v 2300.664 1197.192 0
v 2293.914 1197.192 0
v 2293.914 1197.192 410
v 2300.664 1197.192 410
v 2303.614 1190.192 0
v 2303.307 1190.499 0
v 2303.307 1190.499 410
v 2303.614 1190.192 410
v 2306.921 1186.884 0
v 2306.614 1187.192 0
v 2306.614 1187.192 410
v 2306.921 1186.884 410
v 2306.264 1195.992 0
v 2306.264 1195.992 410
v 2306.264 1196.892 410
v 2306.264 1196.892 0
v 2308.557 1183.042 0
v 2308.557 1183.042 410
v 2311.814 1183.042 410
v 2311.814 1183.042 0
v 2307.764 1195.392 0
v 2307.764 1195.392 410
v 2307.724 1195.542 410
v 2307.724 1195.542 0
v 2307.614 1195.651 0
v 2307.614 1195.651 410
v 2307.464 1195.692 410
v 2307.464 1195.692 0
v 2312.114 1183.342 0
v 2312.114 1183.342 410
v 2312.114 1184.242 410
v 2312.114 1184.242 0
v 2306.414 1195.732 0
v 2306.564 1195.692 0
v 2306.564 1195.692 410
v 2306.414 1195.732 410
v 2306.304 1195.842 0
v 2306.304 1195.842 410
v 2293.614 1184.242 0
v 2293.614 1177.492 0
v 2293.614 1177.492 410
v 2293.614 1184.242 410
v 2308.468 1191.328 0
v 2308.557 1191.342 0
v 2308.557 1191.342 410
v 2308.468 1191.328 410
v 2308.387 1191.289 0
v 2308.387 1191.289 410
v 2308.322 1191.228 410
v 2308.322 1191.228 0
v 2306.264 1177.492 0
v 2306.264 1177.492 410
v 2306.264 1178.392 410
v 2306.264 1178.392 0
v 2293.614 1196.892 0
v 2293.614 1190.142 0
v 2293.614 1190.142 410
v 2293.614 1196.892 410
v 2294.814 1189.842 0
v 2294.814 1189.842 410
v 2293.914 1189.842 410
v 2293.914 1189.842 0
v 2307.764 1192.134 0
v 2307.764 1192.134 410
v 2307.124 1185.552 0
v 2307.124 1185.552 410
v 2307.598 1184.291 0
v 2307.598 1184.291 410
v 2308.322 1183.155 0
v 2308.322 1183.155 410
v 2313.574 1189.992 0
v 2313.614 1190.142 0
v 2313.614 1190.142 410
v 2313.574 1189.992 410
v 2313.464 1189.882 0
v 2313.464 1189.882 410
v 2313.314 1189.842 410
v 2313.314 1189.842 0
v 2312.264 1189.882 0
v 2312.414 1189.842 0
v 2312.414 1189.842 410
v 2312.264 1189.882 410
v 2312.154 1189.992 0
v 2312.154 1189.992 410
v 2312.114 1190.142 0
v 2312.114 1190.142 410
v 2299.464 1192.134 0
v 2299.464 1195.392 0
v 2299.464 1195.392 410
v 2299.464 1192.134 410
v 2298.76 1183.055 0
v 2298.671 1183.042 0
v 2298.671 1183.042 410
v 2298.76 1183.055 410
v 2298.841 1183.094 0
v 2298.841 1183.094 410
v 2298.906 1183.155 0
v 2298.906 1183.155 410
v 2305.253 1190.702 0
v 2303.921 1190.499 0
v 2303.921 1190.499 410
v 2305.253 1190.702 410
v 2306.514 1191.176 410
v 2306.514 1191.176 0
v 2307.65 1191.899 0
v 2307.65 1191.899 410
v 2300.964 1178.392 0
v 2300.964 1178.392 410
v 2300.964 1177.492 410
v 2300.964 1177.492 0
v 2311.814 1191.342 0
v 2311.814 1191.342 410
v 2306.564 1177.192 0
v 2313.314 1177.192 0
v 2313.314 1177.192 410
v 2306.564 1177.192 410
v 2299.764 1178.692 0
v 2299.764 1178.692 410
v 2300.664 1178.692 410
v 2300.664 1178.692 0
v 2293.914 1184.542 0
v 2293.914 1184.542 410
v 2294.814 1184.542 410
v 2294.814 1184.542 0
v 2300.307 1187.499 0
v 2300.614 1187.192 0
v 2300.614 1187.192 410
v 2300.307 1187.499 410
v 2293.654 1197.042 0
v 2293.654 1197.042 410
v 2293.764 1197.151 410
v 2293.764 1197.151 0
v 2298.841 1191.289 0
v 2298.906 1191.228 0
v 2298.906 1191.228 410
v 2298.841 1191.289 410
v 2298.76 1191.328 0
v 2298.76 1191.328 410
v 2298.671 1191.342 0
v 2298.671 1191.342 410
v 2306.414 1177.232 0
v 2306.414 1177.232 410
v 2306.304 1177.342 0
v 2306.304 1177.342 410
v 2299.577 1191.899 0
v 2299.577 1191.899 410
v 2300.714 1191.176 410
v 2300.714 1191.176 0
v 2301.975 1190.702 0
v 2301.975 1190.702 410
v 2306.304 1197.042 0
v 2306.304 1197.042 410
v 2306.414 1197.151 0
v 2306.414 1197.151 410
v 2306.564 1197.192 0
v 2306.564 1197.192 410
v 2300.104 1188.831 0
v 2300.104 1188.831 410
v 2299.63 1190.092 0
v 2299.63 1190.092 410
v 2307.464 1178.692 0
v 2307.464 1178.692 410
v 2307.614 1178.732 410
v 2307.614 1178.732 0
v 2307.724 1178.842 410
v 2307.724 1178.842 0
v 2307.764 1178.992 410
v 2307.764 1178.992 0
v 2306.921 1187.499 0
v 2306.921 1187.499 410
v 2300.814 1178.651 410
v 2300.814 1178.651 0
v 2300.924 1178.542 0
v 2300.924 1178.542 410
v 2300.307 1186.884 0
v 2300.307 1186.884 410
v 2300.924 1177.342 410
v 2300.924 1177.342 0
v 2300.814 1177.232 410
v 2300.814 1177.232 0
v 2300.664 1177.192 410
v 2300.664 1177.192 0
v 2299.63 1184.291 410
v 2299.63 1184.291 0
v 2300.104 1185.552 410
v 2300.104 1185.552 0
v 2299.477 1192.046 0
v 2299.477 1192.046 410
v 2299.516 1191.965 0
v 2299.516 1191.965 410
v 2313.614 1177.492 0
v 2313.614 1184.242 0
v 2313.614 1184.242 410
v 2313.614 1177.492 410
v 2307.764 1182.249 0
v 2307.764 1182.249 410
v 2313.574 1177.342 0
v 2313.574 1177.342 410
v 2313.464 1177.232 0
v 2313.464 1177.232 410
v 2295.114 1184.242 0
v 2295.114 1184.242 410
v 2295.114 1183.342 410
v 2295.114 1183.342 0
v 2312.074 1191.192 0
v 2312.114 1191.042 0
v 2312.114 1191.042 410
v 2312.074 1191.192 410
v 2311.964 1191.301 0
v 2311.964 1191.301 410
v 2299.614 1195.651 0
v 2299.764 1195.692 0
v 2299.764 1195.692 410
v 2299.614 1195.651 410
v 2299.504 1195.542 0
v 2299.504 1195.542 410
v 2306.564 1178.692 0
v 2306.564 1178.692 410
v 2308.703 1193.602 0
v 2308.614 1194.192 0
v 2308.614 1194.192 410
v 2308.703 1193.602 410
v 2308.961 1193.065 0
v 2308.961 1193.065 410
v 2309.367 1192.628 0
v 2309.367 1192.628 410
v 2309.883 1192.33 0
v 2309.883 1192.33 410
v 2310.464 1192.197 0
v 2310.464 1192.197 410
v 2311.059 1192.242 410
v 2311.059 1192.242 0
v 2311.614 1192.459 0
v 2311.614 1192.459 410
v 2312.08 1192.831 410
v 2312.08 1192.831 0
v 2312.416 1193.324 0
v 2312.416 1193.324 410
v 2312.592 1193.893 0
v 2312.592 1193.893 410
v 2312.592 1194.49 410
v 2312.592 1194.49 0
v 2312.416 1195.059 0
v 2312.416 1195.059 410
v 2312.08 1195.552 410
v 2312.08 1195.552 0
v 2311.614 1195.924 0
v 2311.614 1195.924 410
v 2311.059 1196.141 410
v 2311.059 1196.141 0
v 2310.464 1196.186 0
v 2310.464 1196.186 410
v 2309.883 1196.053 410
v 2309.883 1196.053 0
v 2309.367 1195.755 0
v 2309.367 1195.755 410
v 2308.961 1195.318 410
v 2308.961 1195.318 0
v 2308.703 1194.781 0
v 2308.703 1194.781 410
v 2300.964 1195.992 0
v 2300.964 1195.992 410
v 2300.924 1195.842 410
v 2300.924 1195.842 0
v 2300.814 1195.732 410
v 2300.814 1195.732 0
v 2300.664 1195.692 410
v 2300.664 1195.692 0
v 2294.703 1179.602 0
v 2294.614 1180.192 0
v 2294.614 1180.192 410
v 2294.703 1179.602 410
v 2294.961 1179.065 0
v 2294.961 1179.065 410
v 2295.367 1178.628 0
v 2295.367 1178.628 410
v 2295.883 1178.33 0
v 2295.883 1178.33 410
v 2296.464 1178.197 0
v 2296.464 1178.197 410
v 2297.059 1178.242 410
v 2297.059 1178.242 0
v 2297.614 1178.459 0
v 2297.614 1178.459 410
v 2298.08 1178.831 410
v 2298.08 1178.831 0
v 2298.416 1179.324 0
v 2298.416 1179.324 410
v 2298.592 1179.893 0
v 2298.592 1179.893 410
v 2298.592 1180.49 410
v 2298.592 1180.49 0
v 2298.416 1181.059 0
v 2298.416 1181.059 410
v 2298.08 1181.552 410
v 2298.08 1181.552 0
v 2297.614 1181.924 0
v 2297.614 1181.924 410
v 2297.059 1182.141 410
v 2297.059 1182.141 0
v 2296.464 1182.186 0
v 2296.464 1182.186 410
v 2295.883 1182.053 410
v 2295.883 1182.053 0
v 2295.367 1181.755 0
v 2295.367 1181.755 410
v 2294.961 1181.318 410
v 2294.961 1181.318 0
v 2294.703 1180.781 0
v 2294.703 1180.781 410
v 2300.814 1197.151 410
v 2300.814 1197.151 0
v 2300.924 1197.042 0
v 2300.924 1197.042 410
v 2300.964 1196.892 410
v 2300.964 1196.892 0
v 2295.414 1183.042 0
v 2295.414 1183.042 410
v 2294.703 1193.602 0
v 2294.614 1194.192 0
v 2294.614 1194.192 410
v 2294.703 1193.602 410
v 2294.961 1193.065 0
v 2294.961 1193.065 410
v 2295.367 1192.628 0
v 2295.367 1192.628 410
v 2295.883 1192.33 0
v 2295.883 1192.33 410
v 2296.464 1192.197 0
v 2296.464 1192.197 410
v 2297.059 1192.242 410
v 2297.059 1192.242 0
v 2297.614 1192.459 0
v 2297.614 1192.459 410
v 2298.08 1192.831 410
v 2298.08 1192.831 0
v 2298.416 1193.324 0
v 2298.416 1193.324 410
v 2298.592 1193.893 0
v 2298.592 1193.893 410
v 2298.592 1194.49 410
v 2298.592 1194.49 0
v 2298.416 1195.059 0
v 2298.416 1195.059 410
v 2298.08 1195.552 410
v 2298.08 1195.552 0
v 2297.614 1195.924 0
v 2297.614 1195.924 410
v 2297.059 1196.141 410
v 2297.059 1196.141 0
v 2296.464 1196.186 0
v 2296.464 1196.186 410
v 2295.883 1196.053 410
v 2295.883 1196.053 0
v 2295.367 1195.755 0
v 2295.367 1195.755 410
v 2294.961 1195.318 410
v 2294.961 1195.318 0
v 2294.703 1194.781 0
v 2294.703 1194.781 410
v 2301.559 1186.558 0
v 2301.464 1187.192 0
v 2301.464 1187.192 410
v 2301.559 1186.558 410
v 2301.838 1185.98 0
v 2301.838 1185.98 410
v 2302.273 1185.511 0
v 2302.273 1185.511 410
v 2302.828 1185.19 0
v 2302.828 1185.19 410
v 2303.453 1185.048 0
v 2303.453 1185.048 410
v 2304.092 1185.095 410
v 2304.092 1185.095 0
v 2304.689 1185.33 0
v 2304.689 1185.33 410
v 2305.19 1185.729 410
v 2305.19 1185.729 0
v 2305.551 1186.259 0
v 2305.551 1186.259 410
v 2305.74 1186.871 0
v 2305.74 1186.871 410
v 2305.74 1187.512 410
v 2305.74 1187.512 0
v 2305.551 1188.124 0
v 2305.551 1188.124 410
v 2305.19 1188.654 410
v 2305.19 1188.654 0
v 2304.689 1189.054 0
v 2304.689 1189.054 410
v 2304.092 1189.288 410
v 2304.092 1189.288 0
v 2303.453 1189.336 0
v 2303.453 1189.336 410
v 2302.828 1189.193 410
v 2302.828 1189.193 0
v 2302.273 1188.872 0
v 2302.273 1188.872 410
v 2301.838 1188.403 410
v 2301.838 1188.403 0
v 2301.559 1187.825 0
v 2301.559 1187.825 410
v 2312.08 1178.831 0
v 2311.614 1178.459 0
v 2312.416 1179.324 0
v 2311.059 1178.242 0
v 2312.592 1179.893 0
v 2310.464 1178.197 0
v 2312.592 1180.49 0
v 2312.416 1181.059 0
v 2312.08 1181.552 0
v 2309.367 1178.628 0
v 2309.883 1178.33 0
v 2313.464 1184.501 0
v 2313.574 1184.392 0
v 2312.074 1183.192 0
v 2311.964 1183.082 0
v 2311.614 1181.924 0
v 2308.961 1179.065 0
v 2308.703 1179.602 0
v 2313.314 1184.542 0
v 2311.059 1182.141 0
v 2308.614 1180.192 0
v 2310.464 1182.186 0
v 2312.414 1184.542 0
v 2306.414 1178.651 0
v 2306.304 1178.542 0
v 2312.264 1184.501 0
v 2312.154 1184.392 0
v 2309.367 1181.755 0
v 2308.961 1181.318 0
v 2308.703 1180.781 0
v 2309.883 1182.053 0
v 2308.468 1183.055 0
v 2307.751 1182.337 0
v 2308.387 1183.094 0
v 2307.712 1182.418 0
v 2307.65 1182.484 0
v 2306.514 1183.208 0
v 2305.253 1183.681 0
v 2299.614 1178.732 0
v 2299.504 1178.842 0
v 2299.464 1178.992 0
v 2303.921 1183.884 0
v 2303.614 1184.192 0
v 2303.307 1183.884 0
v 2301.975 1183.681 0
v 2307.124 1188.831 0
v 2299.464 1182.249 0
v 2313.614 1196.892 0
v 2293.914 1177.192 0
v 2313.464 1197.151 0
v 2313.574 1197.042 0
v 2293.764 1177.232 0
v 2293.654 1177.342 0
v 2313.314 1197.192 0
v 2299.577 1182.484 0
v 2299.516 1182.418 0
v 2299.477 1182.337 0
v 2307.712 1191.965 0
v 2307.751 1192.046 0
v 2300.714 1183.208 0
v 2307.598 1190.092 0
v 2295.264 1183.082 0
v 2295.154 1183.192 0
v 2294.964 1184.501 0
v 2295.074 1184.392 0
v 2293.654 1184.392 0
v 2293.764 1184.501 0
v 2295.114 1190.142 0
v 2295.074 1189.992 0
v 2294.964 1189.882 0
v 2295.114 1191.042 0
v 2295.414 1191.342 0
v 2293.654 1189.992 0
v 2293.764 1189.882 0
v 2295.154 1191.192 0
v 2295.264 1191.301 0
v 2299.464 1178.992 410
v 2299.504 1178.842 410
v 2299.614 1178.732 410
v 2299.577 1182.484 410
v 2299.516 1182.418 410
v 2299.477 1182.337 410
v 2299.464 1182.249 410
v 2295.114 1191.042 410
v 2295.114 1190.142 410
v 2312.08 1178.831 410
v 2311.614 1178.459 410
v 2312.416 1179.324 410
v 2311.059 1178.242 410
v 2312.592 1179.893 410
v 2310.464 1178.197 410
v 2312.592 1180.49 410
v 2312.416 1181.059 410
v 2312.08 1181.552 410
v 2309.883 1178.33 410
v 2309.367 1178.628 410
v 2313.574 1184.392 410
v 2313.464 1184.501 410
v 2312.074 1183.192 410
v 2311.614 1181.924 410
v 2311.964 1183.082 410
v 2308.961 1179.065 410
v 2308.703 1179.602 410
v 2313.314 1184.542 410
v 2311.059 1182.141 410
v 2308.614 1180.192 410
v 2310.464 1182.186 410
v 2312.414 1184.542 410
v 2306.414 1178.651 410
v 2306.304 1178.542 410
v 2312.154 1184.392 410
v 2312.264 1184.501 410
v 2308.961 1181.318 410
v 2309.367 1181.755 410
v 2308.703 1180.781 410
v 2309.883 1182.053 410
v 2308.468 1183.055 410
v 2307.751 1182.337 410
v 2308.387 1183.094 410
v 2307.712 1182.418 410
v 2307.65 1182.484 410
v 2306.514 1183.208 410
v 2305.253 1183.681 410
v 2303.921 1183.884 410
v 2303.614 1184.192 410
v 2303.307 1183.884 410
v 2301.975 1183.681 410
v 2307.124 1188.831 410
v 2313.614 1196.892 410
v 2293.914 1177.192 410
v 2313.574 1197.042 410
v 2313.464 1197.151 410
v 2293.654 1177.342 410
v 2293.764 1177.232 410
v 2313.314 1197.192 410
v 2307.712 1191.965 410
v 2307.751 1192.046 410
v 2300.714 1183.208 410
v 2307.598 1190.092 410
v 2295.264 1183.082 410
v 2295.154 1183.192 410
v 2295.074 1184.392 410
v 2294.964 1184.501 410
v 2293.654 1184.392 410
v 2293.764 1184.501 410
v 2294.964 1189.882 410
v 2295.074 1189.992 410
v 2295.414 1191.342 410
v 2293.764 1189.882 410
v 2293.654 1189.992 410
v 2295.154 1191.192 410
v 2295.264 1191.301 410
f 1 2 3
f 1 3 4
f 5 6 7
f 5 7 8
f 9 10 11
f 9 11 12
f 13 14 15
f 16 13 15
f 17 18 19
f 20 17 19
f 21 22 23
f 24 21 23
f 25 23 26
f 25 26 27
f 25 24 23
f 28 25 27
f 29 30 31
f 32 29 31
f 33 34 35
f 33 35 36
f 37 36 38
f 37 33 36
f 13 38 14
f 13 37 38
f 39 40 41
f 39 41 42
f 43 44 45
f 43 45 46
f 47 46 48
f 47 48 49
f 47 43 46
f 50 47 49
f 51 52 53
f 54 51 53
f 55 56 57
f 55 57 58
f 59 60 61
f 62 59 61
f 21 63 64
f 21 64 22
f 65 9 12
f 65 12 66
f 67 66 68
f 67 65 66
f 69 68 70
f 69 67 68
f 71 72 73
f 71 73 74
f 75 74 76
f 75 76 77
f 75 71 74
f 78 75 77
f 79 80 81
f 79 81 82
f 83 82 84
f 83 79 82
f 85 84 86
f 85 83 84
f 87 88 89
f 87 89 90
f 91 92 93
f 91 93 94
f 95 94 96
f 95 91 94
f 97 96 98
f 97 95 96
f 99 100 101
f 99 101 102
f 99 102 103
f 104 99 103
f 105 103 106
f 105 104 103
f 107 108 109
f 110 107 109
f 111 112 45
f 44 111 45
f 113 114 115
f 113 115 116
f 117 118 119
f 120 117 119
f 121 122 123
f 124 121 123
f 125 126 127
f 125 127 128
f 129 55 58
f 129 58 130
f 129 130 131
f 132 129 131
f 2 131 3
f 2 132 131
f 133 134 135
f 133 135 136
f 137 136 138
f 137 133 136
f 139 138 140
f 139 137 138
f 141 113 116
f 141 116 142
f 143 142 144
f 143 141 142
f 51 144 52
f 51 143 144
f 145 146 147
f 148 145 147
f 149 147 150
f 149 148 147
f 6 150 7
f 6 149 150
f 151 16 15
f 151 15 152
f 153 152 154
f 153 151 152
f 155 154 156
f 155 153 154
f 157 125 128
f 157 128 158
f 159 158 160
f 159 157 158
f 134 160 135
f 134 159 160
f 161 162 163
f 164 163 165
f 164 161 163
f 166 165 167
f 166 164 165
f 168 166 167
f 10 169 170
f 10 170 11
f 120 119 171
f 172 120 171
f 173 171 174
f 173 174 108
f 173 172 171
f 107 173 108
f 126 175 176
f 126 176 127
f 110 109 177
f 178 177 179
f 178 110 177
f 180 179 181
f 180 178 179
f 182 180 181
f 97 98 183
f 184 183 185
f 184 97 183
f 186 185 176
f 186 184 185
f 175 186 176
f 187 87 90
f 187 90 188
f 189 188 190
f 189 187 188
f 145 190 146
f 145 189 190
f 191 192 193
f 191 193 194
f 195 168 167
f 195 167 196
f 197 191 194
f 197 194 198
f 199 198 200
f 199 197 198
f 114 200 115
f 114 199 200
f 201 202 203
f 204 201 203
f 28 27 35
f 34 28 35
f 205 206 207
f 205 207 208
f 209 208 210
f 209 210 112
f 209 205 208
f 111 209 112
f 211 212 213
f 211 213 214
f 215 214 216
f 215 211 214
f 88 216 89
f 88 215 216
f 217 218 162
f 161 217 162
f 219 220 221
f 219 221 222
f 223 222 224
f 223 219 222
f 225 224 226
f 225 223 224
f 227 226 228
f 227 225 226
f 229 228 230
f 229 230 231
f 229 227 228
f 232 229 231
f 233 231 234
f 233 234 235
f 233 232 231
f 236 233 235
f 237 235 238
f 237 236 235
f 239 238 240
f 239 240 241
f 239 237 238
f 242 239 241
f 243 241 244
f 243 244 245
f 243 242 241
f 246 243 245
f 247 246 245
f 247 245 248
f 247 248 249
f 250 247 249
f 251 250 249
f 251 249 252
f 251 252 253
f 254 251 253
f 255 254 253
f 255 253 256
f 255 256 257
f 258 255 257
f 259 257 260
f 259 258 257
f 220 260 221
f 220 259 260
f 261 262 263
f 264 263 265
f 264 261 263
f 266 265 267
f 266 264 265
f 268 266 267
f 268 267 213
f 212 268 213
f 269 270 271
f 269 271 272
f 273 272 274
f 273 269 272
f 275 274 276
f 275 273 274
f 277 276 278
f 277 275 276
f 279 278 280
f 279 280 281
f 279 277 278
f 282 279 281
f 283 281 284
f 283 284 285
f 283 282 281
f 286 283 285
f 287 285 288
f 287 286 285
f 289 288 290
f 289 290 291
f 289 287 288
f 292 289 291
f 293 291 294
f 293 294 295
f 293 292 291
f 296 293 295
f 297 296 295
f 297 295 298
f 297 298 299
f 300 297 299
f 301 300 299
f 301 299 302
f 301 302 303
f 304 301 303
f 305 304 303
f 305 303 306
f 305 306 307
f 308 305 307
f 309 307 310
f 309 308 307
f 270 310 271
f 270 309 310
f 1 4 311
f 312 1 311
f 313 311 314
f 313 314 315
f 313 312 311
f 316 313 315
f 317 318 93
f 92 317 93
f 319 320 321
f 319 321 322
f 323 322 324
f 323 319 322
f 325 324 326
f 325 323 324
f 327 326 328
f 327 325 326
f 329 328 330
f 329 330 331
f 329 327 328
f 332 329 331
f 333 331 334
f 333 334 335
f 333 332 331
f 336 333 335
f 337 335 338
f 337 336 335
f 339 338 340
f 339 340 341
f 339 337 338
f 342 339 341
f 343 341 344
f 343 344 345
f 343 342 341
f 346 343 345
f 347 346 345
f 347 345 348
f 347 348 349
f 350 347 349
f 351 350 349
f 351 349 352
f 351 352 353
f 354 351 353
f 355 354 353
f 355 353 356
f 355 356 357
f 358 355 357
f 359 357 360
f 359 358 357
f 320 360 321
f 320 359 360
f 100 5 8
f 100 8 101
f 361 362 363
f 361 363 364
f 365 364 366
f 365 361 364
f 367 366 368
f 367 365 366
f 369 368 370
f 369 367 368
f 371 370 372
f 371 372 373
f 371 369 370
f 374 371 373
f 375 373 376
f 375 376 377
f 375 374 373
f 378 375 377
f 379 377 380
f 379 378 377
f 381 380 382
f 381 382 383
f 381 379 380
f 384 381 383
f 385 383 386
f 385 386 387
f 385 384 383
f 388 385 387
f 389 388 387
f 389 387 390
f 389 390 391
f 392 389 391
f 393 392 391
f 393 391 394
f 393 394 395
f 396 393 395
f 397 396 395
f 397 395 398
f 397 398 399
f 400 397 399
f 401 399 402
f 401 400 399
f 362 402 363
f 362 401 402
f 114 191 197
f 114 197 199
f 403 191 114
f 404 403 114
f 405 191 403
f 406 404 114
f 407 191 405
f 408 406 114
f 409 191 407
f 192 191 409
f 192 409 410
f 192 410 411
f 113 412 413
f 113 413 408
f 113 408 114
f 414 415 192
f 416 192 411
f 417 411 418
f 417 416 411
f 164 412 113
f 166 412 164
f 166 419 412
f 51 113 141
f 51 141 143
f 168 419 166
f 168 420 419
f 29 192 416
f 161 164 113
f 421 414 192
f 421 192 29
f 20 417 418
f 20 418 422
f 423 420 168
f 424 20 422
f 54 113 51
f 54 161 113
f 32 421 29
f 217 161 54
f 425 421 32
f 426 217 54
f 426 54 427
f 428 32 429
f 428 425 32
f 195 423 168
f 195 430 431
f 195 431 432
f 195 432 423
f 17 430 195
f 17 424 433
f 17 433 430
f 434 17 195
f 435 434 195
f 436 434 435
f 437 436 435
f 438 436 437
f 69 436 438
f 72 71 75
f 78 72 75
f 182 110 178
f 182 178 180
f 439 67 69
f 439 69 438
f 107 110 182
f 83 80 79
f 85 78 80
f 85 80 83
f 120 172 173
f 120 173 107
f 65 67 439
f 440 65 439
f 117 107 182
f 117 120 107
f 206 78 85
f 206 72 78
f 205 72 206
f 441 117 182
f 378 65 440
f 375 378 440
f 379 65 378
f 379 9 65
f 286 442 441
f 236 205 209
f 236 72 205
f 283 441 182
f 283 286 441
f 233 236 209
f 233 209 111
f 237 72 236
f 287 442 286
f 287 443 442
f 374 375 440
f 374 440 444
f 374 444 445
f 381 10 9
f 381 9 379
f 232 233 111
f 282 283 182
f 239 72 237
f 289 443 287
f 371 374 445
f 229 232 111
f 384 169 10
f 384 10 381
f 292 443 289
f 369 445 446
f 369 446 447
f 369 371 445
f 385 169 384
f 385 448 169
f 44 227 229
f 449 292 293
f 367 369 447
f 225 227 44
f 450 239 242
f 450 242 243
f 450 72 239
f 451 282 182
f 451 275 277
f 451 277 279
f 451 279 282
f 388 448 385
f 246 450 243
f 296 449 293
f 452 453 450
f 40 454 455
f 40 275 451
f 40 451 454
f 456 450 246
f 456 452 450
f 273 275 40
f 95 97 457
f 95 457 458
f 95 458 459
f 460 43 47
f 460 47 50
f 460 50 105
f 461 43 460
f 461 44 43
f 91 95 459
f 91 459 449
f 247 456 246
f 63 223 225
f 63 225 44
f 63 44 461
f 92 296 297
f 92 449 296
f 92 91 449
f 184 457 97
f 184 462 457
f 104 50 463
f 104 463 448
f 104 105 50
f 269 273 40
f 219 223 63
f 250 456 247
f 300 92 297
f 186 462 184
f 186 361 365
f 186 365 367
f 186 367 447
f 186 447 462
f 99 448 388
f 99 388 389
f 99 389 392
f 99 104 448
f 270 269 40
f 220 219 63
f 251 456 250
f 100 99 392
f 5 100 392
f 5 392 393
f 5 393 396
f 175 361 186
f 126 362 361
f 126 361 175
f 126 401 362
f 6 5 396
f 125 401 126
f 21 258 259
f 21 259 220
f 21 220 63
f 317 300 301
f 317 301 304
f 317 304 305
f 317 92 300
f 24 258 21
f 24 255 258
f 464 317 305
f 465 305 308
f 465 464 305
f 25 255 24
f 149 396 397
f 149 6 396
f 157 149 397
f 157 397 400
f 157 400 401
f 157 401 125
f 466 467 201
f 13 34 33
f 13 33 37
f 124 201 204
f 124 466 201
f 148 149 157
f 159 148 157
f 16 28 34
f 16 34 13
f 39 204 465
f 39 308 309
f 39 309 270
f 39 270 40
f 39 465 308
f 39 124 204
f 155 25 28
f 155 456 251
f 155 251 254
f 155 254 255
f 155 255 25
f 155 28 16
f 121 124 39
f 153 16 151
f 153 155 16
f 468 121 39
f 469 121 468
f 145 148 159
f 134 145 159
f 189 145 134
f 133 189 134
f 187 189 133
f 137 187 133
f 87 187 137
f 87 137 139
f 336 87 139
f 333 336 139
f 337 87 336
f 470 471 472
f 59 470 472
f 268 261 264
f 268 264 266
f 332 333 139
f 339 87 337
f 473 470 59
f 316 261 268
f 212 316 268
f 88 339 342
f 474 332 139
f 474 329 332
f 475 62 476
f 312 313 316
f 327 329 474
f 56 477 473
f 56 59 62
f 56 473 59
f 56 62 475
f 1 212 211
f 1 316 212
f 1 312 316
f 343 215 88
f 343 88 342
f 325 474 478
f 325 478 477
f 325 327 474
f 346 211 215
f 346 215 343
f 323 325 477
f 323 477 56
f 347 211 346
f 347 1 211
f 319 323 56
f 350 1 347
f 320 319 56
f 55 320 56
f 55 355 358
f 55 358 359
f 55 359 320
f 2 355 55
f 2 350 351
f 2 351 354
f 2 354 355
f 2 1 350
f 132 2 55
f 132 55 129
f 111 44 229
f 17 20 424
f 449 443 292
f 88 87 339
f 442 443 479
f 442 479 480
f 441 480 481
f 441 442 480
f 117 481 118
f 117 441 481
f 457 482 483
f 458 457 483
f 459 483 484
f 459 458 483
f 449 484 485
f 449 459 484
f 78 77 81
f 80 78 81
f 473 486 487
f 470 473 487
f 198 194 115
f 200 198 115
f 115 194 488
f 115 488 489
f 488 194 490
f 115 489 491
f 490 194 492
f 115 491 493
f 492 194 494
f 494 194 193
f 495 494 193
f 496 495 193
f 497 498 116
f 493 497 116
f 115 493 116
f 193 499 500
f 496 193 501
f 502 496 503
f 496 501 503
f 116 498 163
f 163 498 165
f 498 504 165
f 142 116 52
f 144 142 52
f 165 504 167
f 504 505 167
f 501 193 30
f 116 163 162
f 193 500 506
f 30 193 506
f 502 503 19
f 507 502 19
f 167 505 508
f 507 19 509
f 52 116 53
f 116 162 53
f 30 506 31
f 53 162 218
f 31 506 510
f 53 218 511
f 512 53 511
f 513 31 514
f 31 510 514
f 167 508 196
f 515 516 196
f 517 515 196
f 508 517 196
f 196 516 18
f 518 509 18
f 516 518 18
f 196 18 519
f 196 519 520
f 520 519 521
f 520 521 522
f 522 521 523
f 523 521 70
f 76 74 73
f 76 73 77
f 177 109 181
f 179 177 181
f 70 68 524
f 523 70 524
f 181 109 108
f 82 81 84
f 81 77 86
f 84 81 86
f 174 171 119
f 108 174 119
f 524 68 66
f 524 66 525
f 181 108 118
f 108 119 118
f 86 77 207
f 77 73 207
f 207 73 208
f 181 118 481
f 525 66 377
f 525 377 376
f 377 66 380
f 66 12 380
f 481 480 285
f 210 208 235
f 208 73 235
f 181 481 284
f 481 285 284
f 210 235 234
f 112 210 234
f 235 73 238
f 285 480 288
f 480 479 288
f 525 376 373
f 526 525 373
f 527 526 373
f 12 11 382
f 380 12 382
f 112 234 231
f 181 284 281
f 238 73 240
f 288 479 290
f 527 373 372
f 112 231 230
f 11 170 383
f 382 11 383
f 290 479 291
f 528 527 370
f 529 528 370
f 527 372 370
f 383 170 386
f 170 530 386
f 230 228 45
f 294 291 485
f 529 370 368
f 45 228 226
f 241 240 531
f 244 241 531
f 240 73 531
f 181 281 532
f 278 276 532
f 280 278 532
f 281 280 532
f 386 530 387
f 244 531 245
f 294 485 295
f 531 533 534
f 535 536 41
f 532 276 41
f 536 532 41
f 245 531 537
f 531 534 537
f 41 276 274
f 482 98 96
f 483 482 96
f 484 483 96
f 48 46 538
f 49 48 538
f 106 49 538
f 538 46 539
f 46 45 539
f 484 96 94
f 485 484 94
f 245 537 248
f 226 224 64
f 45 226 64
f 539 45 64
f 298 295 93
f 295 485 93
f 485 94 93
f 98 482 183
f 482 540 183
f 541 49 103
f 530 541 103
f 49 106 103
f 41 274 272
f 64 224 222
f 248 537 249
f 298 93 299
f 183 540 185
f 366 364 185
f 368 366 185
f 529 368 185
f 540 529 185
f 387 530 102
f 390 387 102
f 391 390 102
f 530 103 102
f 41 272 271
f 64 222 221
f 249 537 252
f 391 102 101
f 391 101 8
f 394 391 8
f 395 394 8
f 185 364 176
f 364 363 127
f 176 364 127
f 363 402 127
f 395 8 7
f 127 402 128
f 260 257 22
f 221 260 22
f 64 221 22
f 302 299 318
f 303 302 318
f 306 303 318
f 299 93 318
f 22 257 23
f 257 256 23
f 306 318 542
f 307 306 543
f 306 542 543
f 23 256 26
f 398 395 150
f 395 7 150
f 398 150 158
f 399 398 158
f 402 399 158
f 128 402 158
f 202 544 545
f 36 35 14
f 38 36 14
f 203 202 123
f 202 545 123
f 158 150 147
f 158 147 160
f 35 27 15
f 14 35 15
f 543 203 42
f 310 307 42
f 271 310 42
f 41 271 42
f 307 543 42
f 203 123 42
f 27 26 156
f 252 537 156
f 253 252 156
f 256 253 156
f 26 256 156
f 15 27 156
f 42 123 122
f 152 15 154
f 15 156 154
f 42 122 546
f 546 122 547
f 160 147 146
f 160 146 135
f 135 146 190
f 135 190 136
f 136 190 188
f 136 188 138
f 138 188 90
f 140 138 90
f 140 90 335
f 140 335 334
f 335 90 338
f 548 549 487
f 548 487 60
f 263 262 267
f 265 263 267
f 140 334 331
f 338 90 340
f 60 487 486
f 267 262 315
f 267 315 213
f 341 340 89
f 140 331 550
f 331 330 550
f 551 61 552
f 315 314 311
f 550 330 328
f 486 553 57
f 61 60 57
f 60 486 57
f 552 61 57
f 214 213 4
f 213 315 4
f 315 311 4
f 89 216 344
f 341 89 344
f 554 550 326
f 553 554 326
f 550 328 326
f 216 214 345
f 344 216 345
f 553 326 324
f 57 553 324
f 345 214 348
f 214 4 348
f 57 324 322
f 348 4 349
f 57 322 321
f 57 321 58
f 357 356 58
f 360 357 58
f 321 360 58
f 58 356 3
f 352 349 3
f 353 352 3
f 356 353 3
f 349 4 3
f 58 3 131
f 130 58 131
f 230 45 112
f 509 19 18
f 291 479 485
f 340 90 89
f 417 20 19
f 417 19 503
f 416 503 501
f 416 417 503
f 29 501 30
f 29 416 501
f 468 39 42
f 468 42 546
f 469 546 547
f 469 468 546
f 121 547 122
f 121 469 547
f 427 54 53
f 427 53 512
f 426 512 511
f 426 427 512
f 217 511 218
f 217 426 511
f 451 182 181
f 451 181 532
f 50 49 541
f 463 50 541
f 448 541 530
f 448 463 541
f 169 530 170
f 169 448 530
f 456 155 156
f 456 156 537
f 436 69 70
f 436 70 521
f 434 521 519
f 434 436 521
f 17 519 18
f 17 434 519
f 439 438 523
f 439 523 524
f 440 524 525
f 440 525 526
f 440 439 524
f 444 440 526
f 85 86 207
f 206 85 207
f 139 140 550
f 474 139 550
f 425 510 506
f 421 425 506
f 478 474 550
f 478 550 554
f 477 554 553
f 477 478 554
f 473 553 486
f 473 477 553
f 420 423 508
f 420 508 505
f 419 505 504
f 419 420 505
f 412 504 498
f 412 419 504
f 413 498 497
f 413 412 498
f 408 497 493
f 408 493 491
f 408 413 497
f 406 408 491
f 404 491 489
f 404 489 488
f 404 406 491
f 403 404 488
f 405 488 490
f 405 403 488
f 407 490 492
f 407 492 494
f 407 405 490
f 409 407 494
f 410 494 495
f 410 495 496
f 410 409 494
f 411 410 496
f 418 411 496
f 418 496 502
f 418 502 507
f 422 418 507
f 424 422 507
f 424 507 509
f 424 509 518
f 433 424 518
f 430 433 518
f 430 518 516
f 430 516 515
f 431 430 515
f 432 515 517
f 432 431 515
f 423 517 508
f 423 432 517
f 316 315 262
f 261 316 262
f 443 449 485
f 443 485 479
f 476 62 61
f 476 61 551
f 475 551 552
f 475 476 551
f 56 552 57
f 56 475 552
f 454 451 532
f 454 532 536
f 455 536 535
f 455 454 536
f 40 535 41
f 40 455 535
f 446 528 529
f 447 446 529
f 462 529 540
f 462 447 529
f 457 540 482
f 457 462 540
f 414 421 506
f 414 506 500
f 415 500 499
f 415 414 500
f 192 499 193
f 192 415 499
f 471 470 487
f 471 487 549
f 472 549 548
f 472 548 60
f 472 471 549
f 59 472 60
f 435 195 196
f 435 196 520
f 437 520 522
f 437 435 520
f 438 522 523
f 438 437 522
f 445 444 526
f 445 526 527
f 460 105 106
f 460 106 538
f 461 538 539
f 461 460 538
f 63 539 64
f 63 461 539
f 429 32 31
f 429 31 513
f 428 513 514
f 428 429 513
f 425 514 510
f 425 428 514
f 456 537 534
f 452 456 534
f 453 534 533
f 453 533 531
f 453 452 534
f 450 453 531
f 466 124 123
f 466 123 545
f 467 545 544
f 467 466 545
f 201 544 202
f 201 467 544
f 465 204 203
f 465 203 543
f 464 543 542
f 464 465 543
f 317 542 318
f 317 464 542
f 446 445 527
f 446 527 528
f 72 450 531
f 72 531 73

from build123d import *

# Parameters (mm, degrees)
MODEL_R         = 2.15
MODEL_R_2       = 2
EXTRUDE_1_DEPTH = 410


with BuildPart() as part:
    # Model → 보스-돌출1 (new body)
    with BuildSketch(Plane.XY):
        with BuildLine():
            Line((2307.763927197, 1192.134297913), (2307.763927197, 1195.391548465))
            ThreePointArc((2307.763927197, 1195.391548465), (2307.676059232, 1195.603680499), (2307.463927197, 1195.691548465))
            Line((2307.463927197, 1195.691548465), (2306.563927197, 1195.691548465))
            ThreePointArc((2306.563927197, 1195.691548465), (2306.351795163, 1195.779416431), (2306.263927197, 1195.991548465))
            Line((2306.263927197, 1195.991548465), (2306.263927197, 1196.891548465))
            ThreePointArc((2306.263927197, 1196.891548465), (2306.351795163, 1197.103680499), (2306.563927197, 1197.191548465))
            Line((2306.563927197, 1197.191548465), (2313.313927197, 1197.191548465))
            ThreePointArc((2313.313927197, 1197.191548465), (2313.526059232, 1197.103680499), (2313.613927197, 1196.891548465))
            Line((2313.613927197, 1196.891548465), (2313.613927197, 1190.141548465))
            ThreePointArc((2313.613927197, 1190.141548465), (2313.526059232, 1189.929416431), (2313.313927197, 1189.841548465))
            Line((2313.313927197, 1189.841548465), (2312.413927197, 1189.841548465))
            ThreePointArc((2312.413927197, 1189.841548465), (2312.201795163, 1189.929416431), (2312.113927197, 1190.141548465))
            Line((2312.113927197, 1190.141548465), (2312.113927197, 1191.041548465))
            ThreePointArc((2312.113927197, 1191.041548465), (2312.026059232, 1191.253680499), (2311.813927197, 1191.341548465))
            Line((2311.813927197, 1191.341548465), (2308.556676645, 1191.341548465))
            ThreePointArc((2308.556676645, 1191.341548465), (2308.426234796, 1191.311705686), (2308.321744595, 1191.228114625))
            ThreePointArc((2308.321744595, 1191.228114625), (2307.328306374, 1189.47356999), (2306.921204563, 1187.498825831))
            Line((2306.921204563, 1187.498825831), (2306.613927197, 1187.191548465))
            Line((2306.613927197, 1187.191548465), (2306.921204563, 1186.884271099))
            ThreePointArc((2306.921204563, 1186.884271099), (2307.328306374, 1184.90952694), (2308.321744595, 1183.154982305))
            ThreePointArc((2308.321744595, 1183.154982305), (2308.426234796, 1183.071391244), (2308.556676645, 1183.041548465))
            Line((2308.556676645, 1183.041548465), (2311.813927197, 1183.041548465))
            ThreePointArc((2311.813927197, 1183.041548465), (2312.026059232, 1183.129416431), (2312.113927197, 1183.341548465))
            Line((2312.113927197, 1183.341548465), (2312.113927197, 1184.241548465))
            ThreePointArc((2312.113927197, 1184.241548465), (2312.201795163, 1184.453680499), (2312.413927197, 1184.541548465))
            Line((2312.413927197, 1184.541548465), (2313.313927197, 1184.541548465))
            ThreePointArc((2313.313927197, 1184.541548465), (2313.526059232, 1184.453680499), (2313.613927197, 1184.241548465))
            Line((2313.613927197, 1184.241548465), (2313.613927197, 1177.491548465))
            ThreePointArc((2313.613927197, 1177.491548465), (2313.526059232, 1177.279416431), (2313.313927197, 1177.191548465))
            Line((2313.313927197, 1177.191548465), (2306.563927197, 1177.191548465))
            ThreePointArc((2306.563927197, 1177.191548465), (2306.351795163, 1177.279416431), (2306.263927197, 1177.491548465))
            Line((2306.263927197, 1177.491548465), (2306.263927197, 1178.391548465))
            ThreePointArc((2306.263927197, 1178.391548465), (2306.351795163, 1178.603680499), (2306.563927197, 1178.691548465))
            Line((2306.563927197, 1178.691548465), (2307.463927197, 1178.691548465))
            ThreePointArc((2307.463927197, 1178.691548465), (2307.676059232, 1178.779416431), (2307.763927197, 1178.991548465))
            Line((2307.763927197, 1178.991548465), (2307.763927197, 1182.248799017))
            ThreePointArc((2307.763927197, 1182.248799017), (2307.734084418, 1182.379240866), (2307.650493357, 1182.483731067))
            ThreePointArc((2307.650493357, 1182.483731067), (2305.895948722, 1183.477169289), (2303.921204563, 1183.884271099))
            Line((2303.921204563, 1183.884271099), (2303.613927197, 1184.191548465))
            Line((2303.613927197, 1184.191548465), (2303.306649831, 1183.884271099))
            ThreePointArc((2303.306649831, 1183.884271099), (2301.331905673, 1183.477169289), (2299.577361038, 1182.483731067))
            ThreePointArc((2299.577361038, 1182.483731067), (2299.493769977, 1182.379240866), (2299.463927197, 1182.248799017))
            Line((2299.463927197, 1182.248799017), (2299.463927197, 1178.991548465))
            ThreePointArc((2299.463927197, 1178.991548465), (2299.551795163, 1178.779416431), (2299.763927197, 1178.691548465))
            Line((2299.763927197, 1178.691548465), (2300.663927197, 1178.691548465))
            ThreePointArc((2300.663927197, 1178.691548465), (2300.876059232, 1178.603680499), (2300.963927197, 1178.391548465))
            Line((2300.963927197, 1178.391548465), (2300.963927197, 1177.491548465))
            ThreePointArc((2300.963927197, 1177.491548465), (2300.876059232, 1177.279416431), (2300.663927197, 1177.191548465))
            Line((2300.663927197, 1177.191548465), (2293.913927197, 1177.191548465))
            ThreePointArc((2293.913927197, 1177.191548465), (2293.701795163, 1177.279416431), (2293.613927197, 1177.491548465))
            Line((2293.613927197, 1177.491548465), (2293.613927197, 1184.241548465))
            ThreePointArc((2293.613927197, 1184.241548465), (2293.701795163, 1184.453680499), (2293.913927197, 1184.541548465))
            Line((2293.913927197, 1184.541548465), (2294.813927197, 1184.541548465))
            ThreePointArc((2294.813927197, 1184.541548465), (2295.026059232, 1184.453680499), (2295.113927197, 1184.241548465))
            Line((2295.113927197, 1184.241548465), (2295.113927197, 1183.341548465))
            ThreePointArc((2295.113927197, 1183.341548465), (2295.201795163, 1183.129416431), (2295.413927197, 1183.041548465))
            Line((2295.413927197, 1183.041548465), (2298.671177749, 1183.041548465))
            ThreePointArc((2298.671177749, 1183.041548465), (2298.801619599, 1183.071391244), (2298.906109799, 1183.154982305))
            ThreePointArc((2298.906109799, 1183.154982305), (2299.899548021, 1184.90952694), (2300.306649831, 1186.884271099))
            Line((2300.306649831, 1186.884271099), (2300.613927197, 1187.191548465))
            Line((2300.613927197, 1187.191548465), (2300.306649831, 1187.498825831))
            ThreePointArc((2300.306649831, 1187.498825831), (2299.899548021, 1189.47356999), (2298.906109799, 1191.228114625))
            ThreePointArc((2298.906109799, 1191.228114625), (2298.801619599, 1191.311705686), (2298.671177749, 1191.341548465))
            Line((2298.671177749, 1191.341548465), (2295.413927197, 1191.341548465))
            ThreePointArc((2295.413927197, 1191.341548465), (2295.201795163, 1191.253680499), (2295.113927197, 1191.041548465))
            Line((2295.113927197, 1191.041548465), (2295.113927197, 1190.141548465))
            ThreePointArc((2295.113927197, 1190.141548465), (2295.026059232, 1189.929416431), (2294.813927197, 1189.841548465))
            Line((2294.813927197, 1189.841548465), (2293.913927197, 1189.841548465))
            ThreePointArc((2293.913927197, 1189.841548465), (2293.701795163, 1189.929416431), (2293.613927197, 1190.141548465))
            Line((2293.613927197, 1190.141548465), (2293.613927197, 1196.891548465))
            ThreePointArc((2293.613927197, 1196.891548465), (2293.701795163, 1197.103680499), (2293.913927197, 1197.191548465))
            Line((2293.913927197, 1197.191548465), (2300.663927197, 1197.191548465))
            ThreePointArc((2300.663927197, 1197.191548465), (2300.876059232, 1197.103680499), (2300.963927197, 1196.891548465))
            Line((2300.963927197, 1196.891548465), (2300.963927197, 1195.991548465))
            ThreePointArc((2300.963927197, 1195.991548465), (2300.876059232, 1195.779416431), (2300.663927197, 1195.691548465))
            Line((2300.663927197, 1195.691548465), (2299.763927197, 1195.691548465))
            ThreePointArc((2299.763927197, 1195.691548465), (2299.551795163, 1195.603680499), (2299.463927197, 1195.391548465))
            Line((2299.463927197, 1195.391548465), (2299.463927197, 1192.134297913))
            ThreePointArc((2299.463927197, 1192.134297913), (2299.493769977, 1192.003856063), (2299.577361038, 1191.899365863))
            ThreePointArc((2299.577361038, 1191.899365863), (2301.331905673, 1190.905927641), (2303.306649831, 1190.498825831))
            Line((2303.306649831, 1190.498825831), (2303.613927197, 1190.191548465))
            Line((2303.613927197, 1190.191548465), (2303.921204563, 1190.498825831))
            ThreePointArc((2303.921204563, 1190.498825831), (2305.895948722, 1190.905927641), (2307.650493357, 1191.899365863))
            ThreePointArc((2307.650493357, 1191.899365863), (2307.734084418, 1192.003856063), (2307.763927197, 1192.134297913))
        make_face()
        with Locations(Location((2303.613927197, 1187.191548465, 0), (0, 0, 180))):
            Circle(MODEL_R, mode=Mode.SUBTRACT)
        with Locations(Location((2296.613927197, 1194.191548465, 0), (0, 0, 180))):
            Circle(MODEL_R_2, mode=Mode.SUBTRACT)
        with Locations(Location((2296.613927197, 1180.191548465, 0), (0, 0, 180))):
            Circle(MODEL_R_2, mode=Mode.SUBTRACT)
        with Locations(Location((2310.613927197, 1194.191548465, 0), (0, 0, 180))):
            Circle(MODEL_R_2, mode=Mode.SUBTRACT)
        with Locations(Location((2310.613927197, 1180.191548465, 0), (0, 0, 180))):
            Circle(MODEL_R_2, mode=Mode.SUBTRACT)
    extrude(amount=EXTRUDE_1_DEPTH)


solid = part.part
